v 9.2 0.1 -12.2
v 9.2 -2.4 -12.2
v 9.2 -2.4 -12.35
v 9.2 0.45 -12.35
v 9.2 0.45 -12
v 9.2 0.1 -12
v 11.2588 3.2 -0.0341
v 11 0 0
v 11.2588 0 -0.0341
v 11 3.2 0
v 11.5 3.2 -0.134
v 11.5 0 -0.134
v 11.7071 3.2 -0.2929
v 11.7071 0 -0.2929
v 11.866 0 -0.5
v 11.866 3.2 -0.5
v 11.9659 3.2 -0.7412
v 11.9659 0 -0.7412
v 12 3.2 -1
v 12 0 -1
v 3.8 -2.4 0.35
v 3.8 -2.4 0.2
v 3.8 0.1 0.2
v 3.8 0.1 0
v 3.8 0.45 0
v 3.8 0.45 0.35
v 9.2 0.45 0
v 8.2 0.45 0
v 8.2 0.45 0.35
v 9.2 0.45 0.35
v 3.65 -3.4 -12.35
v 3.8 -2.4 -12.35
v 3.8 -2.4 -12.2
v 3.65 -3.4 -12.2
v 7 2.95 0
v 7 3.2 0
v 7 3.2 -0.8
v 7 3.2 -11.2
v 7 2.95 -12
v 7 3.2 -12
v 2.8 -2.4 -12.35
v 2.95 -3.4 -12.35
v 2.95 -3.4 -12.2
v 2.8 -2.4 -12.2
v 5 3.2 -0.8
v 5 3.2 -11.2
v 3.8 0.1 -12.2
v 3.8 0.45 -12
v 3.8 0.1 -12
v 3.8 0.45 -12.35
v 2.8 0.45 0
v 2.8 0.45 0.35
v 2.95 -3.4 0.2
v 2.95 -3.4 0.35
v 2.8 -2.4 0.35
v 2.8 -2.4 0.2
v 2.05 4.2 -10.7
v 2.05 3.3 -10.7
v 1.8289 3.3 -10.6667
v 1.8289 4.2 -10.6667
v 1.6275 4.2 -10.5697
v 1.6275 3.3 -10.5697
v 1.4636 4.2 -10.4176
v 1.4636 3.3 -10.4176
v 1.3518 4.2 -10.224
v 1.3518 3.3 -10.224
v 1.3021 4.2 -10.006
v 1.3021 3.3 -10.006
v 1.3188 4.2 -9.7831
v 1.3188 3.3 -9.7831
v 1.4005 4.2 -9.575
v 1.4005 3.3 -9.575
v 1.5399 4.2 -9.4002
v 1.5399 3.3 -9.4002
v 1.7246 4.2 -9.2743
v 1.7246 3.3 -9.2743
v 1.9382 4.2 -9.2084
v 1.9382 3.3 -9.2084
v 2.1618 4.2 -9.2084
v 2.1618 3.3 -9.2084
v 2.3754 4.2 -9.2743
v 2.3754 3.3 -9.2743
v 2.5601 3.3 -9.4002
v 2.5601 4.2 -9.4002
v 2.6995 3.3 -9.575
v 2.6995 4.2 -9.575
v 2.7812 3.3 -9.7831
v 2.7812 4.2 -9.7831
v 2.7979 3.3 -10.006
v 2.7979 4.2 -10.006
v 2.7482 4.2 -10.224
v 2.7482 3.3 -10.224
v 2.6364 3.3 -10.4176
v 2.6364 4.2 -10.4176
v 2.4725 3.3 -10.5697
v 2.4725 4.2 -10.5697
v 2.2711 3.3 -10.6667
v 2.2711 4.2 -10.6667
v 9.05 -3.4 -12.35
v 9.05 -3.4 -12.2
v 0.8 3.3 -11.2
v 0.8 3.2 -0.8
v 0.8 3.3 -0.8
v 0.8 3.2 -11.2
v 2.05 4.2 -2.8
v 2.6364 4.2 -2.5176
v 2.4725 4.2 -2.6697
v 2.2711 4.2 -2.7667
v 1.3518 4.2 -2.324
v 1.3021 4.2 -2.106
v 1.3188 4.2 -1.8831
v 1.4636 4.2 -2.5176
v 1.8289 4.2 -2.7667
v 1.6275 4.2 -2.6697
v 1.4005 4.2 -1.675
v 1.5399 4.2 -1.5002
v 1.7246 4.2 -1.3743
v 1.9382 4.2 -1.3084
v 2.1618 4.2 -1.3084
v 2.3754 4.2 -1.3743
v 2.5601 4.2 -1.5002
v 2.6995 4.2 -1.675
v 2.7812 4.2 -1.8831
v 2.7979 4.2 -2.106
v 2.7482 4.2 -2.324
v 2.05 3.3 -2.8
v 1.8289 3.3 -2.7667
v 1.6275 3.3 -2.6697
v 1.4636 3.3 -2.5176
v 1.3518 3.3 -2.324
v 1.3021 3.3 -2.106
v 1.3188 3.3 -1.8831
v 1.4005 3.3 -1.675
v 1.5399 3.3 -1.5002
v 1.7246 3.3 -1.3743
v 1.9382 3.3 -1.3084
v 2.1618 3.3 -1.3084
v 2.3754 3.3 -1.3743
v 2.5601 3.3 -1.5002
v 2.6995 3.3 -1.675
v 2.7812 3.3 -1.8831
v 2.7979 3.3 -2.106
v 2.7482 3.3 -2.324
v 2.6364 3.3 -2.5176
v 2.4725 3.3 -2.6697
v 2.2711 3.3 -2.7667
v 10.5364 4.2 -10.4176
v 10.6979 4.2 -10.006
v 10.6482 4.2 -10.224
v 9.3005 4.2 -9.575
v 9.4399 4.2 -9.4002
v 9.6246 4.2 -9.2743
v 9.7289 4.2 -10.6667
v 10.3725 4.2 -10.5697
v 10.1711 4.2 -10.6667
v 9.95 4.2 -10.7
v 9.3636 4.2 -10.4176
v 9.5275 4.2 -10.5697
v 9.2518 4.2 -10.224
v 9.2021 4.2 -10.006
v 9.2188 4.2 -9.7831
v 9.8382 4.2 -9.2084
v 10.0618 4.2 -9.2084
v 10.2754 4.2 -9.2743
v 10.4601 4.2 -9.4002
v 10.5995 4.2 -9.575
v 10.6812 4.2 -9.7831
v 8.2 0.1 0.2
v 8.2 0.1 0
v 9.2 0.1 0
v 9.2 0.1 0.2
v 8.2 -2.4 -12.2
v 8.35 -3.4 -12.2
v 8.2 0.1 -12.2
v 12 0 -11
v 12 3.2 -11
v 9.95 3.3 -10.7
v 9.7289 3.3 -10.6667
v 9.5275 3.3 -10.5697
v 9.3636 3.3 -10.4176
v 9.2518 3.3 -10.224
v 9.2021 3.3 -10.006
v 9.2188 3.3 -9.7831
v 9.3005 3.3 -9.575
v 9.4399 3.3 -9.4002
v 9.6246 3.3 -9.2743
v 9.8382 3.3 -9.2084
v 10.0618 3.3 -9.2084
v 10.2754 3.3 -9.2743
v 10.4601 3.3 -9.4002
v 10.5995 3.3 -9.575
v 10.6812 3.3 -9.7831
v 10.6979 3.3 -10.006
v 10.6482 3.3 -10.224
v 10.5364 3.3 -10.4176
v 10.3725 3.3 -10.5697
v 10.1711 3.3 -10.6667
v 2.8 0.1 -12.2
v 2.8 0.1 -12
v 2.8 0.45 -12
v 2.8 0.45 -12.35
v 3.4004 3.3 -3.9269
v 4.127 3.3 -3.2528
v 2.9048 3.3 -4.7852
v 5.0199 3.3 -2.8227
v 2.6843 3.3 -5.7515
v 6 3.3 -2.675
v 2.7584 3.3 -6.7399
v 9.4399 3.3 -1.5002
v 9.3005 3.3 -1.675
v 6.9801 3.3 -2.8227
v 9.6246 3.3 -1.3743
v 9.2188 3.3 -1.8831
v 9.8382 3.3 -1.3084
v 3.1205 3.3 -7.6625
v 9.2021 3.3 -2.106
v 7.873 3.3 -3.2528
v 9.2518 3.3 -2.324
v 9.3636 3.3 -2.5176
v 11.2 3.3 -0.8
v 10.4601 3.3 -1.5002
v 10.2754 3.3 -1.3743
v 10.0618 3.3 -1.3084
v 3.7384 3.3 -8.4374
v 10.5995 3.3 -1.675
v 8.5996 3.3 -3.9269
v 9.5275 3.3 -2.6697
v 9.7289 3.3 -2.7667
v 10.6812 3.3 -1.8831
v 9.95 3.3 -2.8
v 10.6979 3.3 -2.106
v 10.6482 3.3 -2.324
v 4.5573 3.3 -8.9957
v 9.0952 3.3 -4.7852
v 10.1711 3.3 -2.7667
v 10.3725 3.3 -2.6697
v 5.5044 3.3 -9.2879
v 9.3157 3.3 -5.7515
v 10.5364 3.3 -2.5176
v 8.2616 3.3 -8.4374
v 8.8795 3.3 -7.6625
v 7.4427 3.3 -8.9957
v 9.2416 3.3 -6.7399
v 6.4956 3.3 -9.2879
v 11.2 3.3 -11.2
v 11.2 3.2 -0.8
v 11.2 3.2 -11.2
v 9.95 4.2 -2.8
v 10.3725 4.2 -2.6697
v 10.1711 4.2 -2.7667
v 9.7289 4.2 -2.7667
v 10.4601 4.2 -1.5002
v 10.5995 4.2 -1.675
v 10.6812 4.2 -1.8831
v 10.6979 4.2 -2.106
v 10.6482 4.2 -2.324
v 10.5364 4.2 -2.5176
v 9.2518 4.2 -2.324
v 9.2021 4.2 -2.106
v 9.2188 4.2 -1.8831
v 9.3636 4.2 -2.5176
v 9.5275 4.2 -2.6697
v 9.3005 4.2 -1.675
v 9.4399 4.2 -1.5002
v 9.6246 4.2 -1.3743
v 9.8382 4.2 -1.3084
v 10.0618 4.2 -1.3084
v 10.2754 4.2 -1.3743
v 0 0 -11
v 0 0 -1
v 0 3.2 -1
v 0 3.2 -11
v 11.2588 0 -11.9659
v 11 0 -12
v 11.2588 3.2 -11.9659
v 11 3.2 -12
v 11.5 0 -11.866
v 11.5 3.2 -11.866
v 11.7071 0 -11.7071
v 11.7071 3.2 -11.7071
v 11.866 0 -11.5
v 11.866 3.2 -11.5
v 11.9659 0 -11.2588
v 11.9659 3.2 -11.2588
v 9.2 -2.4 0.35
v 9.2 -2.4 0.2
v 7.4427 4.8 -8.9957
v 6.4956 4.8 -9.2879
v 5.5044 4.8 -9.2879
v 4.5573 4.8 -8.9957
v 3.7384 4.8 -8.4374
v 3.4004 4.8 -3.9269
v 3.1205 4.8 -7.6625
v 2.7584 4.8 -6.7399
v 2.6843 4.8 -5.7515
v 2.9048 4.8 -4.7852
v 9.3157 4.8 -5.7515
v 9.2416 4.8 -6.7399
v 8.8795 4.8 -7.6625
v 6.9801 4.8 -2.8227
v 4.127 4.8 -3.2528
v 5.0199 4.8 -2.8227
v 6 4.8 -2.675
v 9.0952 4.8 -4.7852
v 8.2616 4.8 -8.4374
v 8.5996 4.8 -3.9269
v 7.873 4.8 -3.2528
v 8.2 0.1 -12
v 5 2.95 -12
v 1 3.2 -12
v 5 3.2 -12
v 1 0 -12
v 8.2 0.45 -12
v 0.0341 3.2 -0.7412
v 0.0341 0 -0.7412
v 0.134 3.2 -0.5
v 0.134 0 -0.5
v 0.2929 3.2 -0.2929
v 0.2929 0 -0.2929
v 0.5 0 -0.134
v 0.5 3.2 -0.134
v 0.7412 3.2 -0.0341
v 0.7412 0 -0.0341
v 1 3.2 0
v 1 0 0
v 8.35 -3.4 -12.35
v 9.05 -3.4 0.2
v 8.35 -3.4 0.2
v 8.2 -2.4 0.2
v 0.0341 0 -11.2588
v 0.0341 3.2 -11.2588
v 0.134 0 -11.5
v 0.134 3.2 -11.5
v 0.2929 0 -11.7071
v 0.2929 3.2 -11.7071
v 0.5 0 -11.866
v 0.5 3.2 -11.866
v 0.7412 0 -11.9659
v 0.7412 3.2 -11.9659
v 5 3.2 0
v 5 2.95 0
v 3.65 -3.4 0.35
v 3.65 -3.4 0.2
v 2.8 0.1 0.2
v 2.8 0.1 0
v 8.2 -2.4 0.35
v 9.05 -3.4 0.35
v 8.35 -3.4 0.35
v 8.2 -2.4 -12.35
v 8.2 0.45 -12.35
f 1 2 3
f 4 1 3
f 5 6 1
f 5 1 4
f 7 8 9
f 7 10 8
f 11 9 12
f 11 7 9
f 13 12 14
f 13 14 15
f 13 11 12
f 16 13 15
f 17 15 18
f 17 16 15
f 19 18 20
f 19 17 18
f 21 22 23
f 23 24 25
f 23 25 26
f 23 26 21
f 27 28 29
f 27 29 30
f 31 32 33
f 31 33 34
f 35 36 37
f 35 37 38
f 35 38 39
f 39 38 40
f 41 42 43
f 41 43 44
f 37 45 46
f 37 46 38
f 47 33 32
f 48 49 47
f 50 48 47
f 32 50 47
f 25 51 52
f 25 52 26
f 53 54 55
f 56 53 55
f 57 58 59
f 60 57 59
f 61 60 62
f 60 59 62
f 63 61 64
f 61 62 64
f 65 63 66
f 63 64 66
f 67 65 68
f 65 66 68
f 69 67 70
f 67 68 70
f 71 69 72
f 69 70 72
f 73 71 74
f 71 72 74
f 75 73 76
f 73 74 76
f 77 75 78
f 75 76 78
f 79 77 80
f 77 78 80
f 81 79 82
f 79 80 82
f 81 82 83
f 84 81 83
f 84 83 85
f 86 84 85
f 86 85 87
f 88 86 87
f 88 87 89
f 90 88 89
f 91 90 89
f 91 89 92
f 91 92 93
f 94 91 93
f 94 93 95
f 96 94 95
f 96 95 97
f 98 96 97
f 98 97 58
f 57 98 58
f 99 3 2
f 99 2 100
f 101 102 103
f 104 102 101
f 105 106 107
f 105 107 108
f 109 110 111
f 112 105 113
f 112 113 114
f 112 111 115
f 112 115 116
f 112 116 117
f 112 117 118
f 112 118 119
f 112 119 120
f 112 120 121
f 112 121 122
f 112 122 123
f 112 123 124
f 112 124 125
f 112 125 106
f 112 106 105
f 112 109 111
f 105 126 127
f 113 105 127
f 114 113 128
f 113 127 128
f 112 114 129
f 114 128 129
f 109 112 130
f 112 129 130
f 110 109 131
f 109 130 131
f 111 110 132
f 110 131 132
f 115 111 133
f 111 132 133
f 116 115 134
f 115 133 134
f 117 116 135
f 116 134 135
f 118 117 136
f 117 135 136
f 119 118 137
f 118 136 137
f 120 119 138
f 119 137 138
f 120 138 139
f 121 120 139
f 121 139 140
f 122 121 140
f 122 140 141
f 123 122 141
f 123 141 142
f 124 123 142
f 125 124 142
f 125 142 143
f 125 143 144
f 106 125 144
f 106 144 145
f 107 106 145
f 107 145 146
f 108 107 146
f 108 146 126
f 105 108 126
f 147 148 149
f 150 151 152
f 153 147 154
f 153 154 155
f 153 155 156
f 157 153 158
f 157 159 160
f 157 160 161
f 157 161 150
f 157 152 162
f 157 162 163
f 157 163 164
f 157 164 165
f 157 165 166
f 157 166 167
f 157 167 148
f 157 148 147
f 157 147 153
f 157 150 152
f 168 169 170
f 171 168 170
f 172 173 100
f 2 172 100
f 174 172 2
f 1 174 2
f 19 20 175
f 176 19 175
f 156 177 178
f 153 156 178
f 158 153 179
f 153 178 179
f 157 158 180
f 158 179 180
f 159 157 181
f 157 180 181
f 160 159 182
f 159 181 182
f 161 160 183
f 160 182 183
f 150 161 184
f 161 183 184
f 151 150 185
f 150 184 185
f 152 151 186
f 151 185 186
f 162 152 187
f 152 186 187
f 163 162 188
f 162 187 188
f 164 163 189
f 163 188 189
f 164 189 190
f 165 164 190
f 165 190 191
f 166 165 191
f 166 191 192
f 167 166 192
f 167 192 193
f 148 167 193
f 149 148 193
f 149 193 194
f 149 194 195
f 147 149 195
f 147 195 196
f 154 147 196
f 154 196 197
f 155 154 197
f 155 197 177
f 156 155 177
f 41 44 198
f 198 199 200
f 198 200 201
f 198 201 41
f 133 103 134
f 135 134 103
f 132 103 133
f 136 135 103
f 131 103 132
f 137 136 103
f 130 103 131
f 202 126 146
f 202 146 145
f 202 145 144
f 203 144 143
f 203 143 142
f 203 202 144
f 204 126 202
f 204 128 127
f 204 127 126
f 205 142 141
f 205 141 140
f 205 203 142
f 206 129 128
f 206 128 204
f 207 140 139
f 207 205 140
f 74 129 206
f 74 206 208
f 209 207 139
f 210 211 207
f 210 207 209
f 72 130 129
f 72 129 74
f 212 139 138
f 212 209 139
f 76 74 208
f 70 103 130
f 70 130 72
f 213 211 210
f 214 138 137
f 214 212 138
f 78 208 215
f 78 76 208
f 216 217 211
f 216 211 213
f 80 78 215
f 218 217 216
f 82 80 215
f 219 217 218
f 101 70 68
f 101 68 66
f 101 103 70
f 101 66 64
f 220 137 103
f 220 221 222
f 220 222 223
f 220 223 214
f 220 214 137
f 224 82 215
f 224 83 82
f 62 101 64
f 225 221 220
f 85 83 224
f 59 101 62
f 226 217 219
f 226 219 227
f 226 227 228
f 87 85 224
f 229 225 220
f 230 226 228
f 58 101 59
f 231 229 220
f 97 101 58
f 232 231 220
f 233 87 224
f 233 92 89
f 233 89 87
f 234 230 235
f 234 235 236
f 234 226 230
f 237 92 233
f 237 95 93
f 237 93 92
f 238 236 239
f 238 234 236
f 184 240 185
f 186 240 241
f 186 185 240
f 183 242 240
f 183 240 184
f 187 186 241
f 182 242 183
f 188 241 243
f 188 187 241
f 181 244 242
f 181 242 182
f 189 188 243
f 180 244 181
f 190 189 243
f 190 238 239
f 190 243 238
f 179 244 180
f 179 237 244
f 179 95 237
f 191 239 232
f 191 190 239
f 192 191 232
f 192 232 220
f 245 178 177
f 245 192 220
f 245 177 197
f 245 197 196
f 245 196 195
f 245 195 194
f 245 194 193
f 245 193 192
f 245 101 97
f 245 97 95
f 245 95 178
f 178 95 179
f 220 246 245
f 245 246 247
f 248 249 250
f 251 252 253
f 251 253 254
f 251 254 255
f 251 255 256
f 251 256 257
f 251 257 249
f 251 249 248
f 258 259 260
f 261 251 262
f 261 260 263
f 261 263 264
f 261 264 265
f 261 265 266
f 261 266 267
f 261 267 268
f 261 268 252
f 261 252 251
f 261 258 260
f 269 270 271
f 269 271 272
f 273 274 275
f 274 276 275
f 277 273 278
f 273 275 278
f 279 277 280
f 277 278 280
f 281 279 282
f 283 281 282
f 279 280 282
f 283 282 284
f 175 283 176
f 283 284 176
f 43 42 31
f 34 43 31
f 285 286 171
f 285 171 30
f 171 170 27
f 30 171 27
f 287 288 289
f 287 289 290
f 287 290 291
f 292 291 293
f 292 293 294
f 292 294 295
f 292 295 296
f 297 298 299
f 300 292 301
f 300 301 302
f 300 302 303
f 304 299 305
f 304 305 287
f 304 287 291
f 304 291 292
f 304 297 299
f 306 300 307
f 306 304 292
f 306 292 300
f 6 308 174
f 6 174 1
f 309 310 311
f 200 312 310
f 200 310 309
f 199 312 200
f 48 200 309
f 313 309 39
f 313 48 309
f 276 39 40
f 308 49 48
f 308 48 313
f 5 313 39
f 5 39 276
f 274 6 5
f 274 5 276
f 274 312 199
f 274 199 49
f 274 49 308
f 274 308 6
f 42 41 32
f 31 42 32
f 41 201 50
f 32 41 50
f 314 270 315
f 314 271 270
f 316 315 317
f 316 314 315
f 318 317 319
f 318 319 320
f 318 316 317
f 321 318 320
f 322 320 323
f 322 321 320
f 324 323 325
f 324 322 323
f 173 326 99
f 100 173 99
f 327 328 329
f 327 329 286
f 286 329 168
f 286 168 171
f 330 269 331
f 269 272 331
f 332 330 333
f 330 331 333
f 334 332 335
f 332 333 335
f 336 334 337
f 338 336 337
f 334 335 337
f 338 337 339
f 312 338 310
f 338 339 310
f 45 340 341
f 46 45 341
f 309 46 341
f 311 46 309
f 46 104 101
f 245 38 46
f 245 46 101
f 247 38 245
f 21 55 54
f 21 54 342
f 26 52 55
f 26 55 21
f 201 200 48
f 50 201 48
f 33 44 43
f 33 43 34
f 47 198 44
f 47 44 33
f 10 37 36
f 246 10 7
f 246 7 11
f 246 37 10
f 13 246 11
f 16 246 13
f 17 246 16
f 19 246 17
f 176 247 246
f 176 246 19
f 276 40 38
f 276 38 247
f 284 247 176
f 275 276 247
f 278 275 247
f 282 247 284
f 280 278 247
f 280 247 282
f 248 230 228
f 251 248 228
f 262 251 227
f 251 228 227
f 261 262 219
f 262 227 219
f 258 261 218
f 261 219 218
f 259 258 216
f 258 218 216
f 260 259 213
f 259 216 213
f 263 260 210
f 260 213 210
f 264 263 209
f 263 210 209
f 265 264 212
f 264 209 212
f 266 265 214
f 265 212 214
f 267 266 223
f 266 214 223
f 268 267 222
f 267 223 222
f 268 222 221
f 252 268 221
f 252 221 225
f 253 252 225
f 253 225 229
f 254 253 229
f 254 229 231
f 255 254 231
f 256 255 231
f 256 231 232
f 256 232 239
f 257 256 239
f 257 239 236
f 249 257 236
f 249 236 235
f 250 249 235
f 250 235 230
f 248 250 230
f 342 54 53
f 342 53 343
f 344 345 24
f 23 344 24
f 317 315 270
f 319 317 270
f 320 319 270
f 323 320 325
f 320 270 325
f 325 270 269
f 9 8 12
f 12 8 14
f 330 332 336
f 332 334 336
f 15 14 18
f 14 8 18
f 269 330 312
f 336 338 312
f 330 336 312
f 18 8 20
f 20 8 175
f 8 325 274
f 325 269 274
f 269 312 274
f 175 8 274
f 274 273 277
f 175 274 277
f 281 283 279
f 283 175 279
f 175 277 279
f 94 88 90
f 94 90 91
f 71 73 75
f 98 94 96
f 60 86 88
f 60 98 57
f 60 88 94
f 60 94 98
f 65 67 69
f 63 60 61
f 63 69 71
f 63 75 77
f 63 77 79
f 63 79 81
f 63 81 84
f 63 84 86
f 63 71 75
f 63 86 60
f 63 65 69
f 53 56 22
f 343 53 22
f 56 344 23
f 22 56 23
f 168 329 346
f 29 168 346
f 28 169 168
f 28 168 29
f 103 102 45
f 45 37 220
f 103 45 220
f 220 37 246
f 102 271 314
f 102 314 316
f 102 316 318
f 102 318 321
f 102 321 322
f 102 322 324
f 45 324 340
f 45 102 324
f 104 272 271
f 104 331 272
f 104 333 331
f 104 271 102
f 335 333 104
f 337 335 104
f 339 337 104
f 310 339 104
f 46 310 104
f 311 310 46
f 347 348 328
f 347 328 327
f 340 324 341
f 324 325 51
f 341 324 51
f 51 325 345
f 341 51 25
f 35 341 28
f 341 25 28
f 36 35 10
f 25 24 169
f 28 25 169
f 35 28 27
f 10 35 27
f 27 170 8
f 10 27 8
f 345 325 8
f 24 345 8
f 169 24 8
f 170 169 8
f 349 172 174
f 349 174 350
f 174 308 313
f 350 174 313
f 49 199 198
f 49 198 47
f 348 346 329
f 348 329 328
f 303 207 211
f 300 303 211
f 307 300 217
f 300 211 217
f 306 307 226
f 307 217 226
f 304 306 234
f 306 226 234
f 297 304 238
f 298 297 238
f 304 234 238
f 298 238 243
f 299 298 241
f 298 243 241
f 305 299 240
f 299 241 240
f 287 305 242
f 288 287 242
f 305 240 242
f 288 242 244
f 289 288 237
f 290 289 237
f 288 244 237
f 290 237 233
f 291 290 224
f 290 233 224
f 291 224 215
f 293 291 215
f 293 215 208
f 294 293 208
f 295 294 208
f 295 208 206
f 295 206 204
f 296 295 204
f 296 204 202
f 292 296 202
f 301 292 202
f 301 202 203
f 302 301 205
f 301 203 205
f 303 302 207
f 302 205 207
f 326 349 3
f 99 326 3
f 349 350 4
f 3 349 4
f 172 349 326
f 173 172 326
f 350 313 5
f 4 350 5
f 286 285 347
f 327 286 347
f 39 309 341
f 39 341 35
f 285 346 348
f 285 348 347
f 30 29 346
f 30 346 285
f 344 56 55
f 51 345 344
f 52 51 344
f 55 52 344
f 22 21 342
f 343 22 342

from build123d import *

# Parameters (mm, degrees)
SKETCH1_W           = 12
SKETCH1_H           = 12
BOSS_EXTRUDE1_DEPTH = 3.2
SKETCH2_R           = 0.75
BOSS_EXTRUDE2_DEPTH = 1
SKETCH3_W           = 10.4
SKETCH3_H           = 10.4
BOSS_EXTRUDE3_DEPTH = 0.1
SKETCH4_R           = 3.325
BOSS_EXTRUDE4_DEPTH = 1.5
FILLET1_R           = 1
SKETCH5_W           = 2
SKETCH5_H           = 12
CUT_EXTRUDE1_DEPTH  = 0.25
SKETCH6_W           = 1
SKETCH6_H           = 0.35
BOSS_EXTRUDE5_DEPTH = 0.35
SKETCH7_W           = 1
SKETCH7_H           = 0.15
BOSS_EXTRUDE6_DEPTH = 3.5
CUT_EXTRUDE4_DEPTH  = 18.876311141


with BuildPart() as part:
    # Sketch1 → Boss-Extrude1 (new body)
    with BuildSketch(Plane(origin=(0, 0, 0), x_dir=(1, 0, 0), z_dir=(0, 1, 0))):
        with Locations((6, 6)):
            Rectangle(SKETCH1_W, SKETCH1_H)
    extrude(amount=BOSS_EXTRUDE1_DEPTH)

    # Sketch2 → Boss-Extrude2 (add)
    with BuildSketch(Plane(origin=(0, 3.2, 0), x_dir=(1, 0, 0), z_dir=(0, 1, 0))):
        with Locations((2.05, 9.95)):
            Circle(SKETCH2_R)
        with Locations((9.95, 9.95)):
            Circle(SKETCH2_R)
        with Locations((2.05, 2.05)):
            Circle(SKETCH2_R)
        with Locations((9.95, 2.05)):
            Circle(SKETCH2_R)
    extrude(amount=BOSS_EXTRUDE2_DEPTH)

    # Sketch3 → Boss-Extrude3 (add)
    with BuildSketch(Plane(origin=(0, 3.2, 0), x_dir=(1, 0, 0), z_dir=(0, 1, 0))):
        with Locations((6, 6)):
            Rectangle(SKETCH3_W, SKETCH3_H)
    extrude(amount=BOSS_EXTRUDE3_DEPTH)

    # Sketch4 → Boss-Extrude4 (add)
    with BuildSketch(Plane(origin=(0, 3.3, 0), x_dir=(1, 0, 0), z_dir=(0, 1, 0))):
        with Locations((6, 6)):
            Circle(SKETCH4_R)
    extrude(amount=BOSS_EXTRUDE4_DEPTH)

    # Fillet1
    fillet1_edges = [part.edges().sort_by_distance(p)[0] for p in [
        (0, 1.6, -12),
        (0, 1.6, 0),
        (12, 1.6, 0),
        (12, 1.6, -12),
    ]]
    fillet(fillet1_edges, radius=FILLET1_R)

    # Sketch5 → Cut-Extrude1 (cut)
    with BuildSketch(Plane(origin=(0, 3.2, 0), x_dir=(1, 0, 0), z_dir=(0, 1, 0))):
        with Locations((6, 6)):
            Rectangle(SKETCH5_W, SKETCH5_H)
    extrude(amount=-CUT_EXTRUDE1_DEPTH, mode=Mode.SUBTRACT)

    # Sketch6 → Boss-Extrude5 (add)
    with BuildSketch(Plane.XY):
        with Locations((3.3, 0.275)):
            Rectangle(SKETCH6_W, SKETCH6_H)
        with Locations((8.7, 0.275)):
            Rectangle(SKETCH6_W, SKETCH6_H)
    boss_extrude5 = extrude(amount=BOSS_EXTRUDE5_DEPTH)

    # Sketch7 → Boss-Extrude6 (add)
    with BuildSketch(Plane.XZ.offset(-0.1)):
        with Locations((3.3, 0.275)):
            Rectangle(SKETCH7_W, SKETCH7_H)
        with Locations((8.7, 0.275)):
            Rectangle(SKETCH7_W, SKETCH7_H)
    boss_extrude6 = extrude(amount=BOSS_EXTRUDE6_DEPTH)

    # Sketch8 → Cut-Extrude4 (cut, through all)
    with BuildSketch(Plane.XY.offset(0.35)):
        Polygon((3.8, -2.4), (3.65, -3.4), (3.8, -3.4), align=None)
        Polygon((2.95, -3.4), (2.8, -2.4), (2.8, -3.4), align=None)
        Polygon((8.35, -3.4), (8.2, -2.4), (8.2, -3.4), align=None)
        Polygon((9.2, -3.4), (9.2, -2.4), (9.05, -3.4), align=None)
    cut_extrude4 = extrude(amount=-CUT_EXTRUDE4_DEPTH, mode=Mode.SUBTRACT)

    # Mirror1: Boss-Extrude5, Boss-Extrude6, Cut-Extrude4 across plane
    add(boss_extrude5.mirror(Plane.XY.offset(-6)))
    add(boss_extrude6.mirror(Plane.XY.offset(-6)))
    add(cut_extrude4.mirror(Plane.XY.offset(-6)), mode=Mode.SUBTRACT)


solid = part.part
